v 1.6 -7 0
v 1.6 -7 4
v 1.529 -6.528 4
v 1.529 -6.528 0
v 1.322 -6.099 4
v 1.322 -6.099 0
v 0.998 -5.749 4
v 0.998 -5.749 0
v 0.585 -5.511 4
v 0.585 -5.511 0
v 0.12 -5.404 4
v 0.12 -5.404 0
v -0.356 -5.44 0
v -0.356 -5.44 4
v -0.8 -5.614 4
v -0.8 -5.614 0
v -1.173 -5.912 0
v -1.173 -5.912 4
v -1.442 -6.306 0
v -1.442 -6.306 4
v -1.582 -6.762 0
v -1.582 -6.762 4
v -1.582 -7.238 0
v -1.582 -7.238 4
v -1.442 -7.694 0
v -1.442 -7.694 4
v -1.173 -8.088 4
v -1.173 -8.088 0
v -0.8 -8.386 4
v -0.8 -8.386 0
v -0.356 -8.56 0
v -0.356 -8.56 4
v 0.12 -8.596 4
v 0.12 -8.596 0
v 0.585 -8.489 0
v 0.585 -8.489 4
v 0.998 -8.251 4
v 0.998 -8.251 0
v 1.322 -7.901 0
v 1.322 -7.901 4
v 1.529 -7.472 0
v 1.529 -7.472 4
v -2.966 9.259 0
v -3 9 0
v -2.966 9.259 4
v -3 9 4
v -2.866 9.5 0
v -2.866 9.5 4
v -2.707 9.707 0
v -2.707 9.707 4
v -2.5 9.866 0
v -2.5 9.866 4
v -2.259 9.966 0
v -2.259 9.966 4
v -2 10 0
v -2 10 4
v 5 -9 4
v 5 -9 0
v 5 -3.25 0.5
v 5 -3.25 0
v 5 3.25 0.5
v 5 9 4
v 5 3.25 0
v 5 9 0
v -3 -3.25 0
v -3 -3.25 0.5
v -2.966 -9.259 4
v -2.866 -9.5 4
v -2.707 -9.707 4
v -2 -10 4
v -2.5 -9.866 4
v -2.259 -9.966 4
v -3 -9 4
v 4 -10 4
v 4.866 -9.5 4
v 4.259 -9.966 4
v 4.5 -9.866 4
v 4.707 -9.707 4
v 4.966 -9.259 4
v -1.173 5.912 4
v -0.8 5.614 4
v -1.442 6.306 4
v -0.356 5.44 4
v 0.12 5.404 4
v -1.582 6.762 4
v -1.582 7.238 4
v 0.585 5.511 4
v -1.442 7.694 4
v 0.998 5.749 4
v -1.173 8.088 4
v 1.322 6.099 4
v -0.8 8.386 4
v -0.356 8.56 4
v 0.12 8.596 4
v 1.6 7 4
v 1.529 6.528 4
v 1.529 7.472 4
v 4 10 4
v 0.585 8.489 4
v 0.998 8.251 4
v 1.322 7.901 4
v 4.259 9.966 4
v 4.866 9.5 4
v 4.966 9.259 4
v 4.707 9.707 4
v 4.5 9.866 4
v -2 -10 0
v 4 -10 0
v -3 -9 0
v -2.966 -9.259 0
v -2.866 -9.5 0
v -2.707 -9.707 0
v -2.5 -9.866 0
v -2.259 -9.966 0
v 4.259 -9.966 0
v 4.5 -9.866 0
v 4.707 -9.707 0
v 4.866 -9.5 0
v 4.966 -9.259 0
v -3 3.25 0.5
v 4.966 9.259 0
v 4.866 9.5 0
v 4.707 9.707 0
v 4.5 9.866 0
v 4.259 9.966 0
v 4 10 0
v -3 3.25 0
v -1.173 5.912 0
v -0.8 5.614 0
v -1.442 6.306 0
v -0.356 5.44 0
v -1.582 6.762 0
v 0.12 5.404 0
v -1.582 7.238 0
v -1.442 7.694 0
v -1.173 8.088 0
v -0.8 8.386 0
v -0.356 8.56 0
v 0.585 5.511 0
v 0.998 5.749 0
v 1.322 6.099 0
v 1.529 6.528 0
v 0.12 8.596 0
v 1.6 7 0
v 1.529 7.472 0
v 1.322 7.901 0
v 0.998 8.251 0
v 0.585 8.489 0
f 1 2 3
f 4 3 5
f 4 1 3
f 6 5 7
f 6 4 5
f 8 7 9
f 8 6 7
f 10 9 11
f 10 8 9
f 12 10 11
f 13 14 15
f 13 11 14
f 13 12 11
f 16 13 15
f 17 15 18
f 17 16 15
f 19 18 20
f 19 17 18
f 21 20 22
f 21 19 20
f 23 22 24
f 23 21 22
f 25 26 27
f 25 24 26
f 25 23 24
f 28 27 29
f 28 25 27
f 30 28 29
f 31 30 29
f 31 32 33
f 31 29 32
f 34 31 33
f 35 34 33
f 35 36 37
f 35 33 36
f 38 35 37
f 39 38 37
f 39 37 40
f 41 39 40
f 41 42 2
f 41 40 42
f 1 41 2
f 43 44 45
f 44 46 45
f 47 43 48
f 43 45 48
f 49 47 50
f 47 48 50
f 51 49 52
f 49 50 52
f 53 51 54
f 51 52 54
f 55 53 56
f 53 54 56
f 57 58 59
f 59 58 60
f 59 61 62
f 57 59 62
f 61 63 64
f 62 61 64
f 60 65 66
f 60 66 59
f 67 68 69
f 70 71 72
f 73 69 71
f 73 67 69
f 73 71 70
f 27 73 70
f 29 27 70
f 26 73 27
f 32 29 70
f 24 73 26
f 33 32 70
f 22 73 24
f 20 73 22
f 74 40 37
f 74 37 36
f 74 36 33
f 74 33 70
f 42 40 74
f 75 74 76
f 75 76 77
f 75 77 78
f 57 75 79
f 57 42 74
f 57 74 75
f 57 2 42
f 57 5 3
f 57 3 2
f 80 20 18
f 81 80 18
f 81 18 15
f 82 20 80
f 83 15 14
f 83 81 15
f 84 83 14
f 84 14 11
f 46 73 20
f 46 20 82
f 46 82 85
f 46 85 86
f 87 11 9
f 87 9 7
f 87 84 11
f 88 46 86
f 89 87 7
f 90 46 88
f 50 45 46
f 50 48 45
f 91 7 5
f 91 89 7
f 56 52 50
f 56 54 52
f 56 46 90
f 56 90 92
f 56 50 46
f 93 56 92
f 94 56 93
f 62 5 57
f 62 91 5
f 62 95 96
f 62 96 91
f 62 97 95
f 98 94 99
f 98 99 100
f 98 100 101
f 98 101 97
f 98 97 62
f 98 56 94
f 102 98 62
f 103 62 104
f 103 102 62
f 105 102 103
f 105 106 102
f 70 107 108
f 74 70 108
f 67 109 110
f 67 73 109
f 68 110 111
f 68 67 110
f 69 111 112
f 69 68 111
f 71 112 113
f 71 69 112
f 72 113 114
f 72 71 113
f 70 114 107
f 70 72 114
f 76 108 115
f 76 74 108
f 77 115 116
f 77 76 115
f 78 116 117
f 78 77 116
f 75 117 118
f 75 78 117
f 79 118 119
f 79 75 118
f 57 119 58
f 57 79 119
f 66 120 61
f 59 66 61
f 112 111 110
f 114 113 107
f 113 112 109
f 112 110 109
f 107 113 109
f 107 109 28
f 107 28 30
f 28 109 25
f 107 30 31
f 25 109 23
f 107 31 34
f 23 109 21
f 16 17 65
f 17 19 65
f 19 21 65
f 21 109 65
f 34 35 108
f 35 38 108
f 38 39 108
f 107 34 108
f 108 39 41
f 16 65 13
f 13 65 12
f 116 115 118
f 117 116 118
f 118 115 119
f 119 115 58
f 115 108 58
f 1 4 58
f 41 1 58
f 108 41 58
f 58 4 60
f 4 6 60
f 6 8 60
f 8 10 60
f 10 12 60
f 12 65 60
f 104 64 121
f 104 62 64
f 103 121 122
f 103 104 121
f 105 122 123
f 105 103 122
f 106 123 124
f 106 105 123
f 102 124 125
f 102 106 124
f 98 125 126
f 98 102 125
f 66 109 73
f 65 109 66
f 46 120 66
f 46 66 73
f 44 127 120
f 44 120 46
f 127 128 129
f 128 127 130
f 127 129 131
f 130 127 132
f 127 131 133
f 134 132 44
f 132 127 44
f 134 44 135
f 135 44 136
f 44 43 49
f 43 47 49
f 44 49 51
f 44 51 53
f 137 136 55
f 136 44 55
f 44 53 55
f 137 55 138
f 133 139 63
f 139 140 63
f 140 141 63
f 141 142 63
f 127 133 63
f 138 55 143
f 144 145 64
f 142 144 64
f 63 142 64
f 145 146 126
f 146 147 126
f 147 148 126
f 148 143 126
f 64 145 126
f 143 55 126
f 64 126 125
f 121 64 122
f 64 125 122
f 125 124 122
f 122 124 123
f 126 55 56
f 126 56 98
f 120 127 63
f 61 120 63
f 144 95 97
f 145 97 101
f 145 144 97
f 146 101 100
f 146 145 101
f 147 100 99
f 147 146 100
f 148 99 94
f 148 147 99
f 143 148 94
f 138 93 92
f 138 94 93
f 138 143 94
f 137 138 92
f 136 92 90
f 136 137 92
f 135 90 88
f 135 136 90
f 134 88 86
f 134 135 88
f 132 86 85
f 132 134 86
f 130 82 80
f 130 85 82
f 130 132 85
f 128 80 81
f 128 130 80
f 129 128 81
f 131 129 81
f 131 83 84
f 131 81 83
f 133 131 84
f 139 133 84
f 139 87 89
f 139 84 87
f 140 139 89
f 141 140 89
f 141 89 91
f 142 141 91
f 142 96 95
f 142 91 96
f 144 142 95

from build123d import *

# Parameters (mm, degrees)
BOX009_W          = 10
BOX009_H          = 6.5
BOX009_DEPTH      = 0.5
CYLINDER012_R     = 1.6
CYLINDER012_DEPTH = 10
CYLINDER011_R     = 1.6
CYLINDER011_DEPTH = 10
BOX008_W          = 8
BOX008_H          = 20
BOX008_DEPTH      = 4
FILLET002_R       = 1


with BuildPart() as cube009:
    # Box009 → Box009 (new body)
    with BuildSketch(Plane(origin=(-4, -3.25, 0), x_dir=(1, 0, 0), z_dir=(0, 0, 1))):
        with Locations((5, 3.25)):
            Rectangle(BOX009_W, BOX009_H)
    extrude(amount=BOX009_DEPTH)


with BuildPart() as cylinder012:
    # Cylinder012 → Cylinder012 (new body)
    with BuildSketch(Plane(origin=(0, -7, 0), x_dir=(1, 0, 0), z_dir=(0, 0, 1))):
        Circle(CYLINDER012_R)
    extrude(amount=CYLINDER012_DEPTH)


with BuildPart() as fusion017:
    # Cylinder011 → Cylinder011 (new body)
    with BuildSketch(Plane(origin=(0, 7, 0), x_dir=(1, 0, 0), z_dir=(0, 0, 1))):
        Circle(CYLINDER011_R)
    extrude(amount=CYLINDER011_DEPTH)

    # Fusion017: union Cylinder012
    add(cylinder012.part)


with BuildPart() as belt_clamp002:
    # Box008 → Box008 (new body)
    with BuildSketch(Plane(origin=(-3, -10, 0), x_dir=(1, 0, 0), z_dir=(0, 0, 1))):
        with Locations((4, 10)):
            Rectangle(BOX008_W, BOX008_H)
    extrude(amount=BOX008_DEPTH)

    # Fillet002
    fillet002_edges = [belt_clamp002.edges().sort_by_distance(p)[0] for p in [
        (-3, -10, 2),
        (-3, 10, 2),
        (5, -10, 2),
        (5, 10, 2),
    ]]
    fillet(fillet002_edges, radius=FILLET002_R)

    # Cut008004003012001003001009: cut Fusion017
    add(fusion017.part, mode=Mode.SUBTRACT)

    # Cut008004003012001003001010: cut Cube009
    add(cube009.part, mode=Mode.SUBTRACT)


solid = belt_clamp002.part
